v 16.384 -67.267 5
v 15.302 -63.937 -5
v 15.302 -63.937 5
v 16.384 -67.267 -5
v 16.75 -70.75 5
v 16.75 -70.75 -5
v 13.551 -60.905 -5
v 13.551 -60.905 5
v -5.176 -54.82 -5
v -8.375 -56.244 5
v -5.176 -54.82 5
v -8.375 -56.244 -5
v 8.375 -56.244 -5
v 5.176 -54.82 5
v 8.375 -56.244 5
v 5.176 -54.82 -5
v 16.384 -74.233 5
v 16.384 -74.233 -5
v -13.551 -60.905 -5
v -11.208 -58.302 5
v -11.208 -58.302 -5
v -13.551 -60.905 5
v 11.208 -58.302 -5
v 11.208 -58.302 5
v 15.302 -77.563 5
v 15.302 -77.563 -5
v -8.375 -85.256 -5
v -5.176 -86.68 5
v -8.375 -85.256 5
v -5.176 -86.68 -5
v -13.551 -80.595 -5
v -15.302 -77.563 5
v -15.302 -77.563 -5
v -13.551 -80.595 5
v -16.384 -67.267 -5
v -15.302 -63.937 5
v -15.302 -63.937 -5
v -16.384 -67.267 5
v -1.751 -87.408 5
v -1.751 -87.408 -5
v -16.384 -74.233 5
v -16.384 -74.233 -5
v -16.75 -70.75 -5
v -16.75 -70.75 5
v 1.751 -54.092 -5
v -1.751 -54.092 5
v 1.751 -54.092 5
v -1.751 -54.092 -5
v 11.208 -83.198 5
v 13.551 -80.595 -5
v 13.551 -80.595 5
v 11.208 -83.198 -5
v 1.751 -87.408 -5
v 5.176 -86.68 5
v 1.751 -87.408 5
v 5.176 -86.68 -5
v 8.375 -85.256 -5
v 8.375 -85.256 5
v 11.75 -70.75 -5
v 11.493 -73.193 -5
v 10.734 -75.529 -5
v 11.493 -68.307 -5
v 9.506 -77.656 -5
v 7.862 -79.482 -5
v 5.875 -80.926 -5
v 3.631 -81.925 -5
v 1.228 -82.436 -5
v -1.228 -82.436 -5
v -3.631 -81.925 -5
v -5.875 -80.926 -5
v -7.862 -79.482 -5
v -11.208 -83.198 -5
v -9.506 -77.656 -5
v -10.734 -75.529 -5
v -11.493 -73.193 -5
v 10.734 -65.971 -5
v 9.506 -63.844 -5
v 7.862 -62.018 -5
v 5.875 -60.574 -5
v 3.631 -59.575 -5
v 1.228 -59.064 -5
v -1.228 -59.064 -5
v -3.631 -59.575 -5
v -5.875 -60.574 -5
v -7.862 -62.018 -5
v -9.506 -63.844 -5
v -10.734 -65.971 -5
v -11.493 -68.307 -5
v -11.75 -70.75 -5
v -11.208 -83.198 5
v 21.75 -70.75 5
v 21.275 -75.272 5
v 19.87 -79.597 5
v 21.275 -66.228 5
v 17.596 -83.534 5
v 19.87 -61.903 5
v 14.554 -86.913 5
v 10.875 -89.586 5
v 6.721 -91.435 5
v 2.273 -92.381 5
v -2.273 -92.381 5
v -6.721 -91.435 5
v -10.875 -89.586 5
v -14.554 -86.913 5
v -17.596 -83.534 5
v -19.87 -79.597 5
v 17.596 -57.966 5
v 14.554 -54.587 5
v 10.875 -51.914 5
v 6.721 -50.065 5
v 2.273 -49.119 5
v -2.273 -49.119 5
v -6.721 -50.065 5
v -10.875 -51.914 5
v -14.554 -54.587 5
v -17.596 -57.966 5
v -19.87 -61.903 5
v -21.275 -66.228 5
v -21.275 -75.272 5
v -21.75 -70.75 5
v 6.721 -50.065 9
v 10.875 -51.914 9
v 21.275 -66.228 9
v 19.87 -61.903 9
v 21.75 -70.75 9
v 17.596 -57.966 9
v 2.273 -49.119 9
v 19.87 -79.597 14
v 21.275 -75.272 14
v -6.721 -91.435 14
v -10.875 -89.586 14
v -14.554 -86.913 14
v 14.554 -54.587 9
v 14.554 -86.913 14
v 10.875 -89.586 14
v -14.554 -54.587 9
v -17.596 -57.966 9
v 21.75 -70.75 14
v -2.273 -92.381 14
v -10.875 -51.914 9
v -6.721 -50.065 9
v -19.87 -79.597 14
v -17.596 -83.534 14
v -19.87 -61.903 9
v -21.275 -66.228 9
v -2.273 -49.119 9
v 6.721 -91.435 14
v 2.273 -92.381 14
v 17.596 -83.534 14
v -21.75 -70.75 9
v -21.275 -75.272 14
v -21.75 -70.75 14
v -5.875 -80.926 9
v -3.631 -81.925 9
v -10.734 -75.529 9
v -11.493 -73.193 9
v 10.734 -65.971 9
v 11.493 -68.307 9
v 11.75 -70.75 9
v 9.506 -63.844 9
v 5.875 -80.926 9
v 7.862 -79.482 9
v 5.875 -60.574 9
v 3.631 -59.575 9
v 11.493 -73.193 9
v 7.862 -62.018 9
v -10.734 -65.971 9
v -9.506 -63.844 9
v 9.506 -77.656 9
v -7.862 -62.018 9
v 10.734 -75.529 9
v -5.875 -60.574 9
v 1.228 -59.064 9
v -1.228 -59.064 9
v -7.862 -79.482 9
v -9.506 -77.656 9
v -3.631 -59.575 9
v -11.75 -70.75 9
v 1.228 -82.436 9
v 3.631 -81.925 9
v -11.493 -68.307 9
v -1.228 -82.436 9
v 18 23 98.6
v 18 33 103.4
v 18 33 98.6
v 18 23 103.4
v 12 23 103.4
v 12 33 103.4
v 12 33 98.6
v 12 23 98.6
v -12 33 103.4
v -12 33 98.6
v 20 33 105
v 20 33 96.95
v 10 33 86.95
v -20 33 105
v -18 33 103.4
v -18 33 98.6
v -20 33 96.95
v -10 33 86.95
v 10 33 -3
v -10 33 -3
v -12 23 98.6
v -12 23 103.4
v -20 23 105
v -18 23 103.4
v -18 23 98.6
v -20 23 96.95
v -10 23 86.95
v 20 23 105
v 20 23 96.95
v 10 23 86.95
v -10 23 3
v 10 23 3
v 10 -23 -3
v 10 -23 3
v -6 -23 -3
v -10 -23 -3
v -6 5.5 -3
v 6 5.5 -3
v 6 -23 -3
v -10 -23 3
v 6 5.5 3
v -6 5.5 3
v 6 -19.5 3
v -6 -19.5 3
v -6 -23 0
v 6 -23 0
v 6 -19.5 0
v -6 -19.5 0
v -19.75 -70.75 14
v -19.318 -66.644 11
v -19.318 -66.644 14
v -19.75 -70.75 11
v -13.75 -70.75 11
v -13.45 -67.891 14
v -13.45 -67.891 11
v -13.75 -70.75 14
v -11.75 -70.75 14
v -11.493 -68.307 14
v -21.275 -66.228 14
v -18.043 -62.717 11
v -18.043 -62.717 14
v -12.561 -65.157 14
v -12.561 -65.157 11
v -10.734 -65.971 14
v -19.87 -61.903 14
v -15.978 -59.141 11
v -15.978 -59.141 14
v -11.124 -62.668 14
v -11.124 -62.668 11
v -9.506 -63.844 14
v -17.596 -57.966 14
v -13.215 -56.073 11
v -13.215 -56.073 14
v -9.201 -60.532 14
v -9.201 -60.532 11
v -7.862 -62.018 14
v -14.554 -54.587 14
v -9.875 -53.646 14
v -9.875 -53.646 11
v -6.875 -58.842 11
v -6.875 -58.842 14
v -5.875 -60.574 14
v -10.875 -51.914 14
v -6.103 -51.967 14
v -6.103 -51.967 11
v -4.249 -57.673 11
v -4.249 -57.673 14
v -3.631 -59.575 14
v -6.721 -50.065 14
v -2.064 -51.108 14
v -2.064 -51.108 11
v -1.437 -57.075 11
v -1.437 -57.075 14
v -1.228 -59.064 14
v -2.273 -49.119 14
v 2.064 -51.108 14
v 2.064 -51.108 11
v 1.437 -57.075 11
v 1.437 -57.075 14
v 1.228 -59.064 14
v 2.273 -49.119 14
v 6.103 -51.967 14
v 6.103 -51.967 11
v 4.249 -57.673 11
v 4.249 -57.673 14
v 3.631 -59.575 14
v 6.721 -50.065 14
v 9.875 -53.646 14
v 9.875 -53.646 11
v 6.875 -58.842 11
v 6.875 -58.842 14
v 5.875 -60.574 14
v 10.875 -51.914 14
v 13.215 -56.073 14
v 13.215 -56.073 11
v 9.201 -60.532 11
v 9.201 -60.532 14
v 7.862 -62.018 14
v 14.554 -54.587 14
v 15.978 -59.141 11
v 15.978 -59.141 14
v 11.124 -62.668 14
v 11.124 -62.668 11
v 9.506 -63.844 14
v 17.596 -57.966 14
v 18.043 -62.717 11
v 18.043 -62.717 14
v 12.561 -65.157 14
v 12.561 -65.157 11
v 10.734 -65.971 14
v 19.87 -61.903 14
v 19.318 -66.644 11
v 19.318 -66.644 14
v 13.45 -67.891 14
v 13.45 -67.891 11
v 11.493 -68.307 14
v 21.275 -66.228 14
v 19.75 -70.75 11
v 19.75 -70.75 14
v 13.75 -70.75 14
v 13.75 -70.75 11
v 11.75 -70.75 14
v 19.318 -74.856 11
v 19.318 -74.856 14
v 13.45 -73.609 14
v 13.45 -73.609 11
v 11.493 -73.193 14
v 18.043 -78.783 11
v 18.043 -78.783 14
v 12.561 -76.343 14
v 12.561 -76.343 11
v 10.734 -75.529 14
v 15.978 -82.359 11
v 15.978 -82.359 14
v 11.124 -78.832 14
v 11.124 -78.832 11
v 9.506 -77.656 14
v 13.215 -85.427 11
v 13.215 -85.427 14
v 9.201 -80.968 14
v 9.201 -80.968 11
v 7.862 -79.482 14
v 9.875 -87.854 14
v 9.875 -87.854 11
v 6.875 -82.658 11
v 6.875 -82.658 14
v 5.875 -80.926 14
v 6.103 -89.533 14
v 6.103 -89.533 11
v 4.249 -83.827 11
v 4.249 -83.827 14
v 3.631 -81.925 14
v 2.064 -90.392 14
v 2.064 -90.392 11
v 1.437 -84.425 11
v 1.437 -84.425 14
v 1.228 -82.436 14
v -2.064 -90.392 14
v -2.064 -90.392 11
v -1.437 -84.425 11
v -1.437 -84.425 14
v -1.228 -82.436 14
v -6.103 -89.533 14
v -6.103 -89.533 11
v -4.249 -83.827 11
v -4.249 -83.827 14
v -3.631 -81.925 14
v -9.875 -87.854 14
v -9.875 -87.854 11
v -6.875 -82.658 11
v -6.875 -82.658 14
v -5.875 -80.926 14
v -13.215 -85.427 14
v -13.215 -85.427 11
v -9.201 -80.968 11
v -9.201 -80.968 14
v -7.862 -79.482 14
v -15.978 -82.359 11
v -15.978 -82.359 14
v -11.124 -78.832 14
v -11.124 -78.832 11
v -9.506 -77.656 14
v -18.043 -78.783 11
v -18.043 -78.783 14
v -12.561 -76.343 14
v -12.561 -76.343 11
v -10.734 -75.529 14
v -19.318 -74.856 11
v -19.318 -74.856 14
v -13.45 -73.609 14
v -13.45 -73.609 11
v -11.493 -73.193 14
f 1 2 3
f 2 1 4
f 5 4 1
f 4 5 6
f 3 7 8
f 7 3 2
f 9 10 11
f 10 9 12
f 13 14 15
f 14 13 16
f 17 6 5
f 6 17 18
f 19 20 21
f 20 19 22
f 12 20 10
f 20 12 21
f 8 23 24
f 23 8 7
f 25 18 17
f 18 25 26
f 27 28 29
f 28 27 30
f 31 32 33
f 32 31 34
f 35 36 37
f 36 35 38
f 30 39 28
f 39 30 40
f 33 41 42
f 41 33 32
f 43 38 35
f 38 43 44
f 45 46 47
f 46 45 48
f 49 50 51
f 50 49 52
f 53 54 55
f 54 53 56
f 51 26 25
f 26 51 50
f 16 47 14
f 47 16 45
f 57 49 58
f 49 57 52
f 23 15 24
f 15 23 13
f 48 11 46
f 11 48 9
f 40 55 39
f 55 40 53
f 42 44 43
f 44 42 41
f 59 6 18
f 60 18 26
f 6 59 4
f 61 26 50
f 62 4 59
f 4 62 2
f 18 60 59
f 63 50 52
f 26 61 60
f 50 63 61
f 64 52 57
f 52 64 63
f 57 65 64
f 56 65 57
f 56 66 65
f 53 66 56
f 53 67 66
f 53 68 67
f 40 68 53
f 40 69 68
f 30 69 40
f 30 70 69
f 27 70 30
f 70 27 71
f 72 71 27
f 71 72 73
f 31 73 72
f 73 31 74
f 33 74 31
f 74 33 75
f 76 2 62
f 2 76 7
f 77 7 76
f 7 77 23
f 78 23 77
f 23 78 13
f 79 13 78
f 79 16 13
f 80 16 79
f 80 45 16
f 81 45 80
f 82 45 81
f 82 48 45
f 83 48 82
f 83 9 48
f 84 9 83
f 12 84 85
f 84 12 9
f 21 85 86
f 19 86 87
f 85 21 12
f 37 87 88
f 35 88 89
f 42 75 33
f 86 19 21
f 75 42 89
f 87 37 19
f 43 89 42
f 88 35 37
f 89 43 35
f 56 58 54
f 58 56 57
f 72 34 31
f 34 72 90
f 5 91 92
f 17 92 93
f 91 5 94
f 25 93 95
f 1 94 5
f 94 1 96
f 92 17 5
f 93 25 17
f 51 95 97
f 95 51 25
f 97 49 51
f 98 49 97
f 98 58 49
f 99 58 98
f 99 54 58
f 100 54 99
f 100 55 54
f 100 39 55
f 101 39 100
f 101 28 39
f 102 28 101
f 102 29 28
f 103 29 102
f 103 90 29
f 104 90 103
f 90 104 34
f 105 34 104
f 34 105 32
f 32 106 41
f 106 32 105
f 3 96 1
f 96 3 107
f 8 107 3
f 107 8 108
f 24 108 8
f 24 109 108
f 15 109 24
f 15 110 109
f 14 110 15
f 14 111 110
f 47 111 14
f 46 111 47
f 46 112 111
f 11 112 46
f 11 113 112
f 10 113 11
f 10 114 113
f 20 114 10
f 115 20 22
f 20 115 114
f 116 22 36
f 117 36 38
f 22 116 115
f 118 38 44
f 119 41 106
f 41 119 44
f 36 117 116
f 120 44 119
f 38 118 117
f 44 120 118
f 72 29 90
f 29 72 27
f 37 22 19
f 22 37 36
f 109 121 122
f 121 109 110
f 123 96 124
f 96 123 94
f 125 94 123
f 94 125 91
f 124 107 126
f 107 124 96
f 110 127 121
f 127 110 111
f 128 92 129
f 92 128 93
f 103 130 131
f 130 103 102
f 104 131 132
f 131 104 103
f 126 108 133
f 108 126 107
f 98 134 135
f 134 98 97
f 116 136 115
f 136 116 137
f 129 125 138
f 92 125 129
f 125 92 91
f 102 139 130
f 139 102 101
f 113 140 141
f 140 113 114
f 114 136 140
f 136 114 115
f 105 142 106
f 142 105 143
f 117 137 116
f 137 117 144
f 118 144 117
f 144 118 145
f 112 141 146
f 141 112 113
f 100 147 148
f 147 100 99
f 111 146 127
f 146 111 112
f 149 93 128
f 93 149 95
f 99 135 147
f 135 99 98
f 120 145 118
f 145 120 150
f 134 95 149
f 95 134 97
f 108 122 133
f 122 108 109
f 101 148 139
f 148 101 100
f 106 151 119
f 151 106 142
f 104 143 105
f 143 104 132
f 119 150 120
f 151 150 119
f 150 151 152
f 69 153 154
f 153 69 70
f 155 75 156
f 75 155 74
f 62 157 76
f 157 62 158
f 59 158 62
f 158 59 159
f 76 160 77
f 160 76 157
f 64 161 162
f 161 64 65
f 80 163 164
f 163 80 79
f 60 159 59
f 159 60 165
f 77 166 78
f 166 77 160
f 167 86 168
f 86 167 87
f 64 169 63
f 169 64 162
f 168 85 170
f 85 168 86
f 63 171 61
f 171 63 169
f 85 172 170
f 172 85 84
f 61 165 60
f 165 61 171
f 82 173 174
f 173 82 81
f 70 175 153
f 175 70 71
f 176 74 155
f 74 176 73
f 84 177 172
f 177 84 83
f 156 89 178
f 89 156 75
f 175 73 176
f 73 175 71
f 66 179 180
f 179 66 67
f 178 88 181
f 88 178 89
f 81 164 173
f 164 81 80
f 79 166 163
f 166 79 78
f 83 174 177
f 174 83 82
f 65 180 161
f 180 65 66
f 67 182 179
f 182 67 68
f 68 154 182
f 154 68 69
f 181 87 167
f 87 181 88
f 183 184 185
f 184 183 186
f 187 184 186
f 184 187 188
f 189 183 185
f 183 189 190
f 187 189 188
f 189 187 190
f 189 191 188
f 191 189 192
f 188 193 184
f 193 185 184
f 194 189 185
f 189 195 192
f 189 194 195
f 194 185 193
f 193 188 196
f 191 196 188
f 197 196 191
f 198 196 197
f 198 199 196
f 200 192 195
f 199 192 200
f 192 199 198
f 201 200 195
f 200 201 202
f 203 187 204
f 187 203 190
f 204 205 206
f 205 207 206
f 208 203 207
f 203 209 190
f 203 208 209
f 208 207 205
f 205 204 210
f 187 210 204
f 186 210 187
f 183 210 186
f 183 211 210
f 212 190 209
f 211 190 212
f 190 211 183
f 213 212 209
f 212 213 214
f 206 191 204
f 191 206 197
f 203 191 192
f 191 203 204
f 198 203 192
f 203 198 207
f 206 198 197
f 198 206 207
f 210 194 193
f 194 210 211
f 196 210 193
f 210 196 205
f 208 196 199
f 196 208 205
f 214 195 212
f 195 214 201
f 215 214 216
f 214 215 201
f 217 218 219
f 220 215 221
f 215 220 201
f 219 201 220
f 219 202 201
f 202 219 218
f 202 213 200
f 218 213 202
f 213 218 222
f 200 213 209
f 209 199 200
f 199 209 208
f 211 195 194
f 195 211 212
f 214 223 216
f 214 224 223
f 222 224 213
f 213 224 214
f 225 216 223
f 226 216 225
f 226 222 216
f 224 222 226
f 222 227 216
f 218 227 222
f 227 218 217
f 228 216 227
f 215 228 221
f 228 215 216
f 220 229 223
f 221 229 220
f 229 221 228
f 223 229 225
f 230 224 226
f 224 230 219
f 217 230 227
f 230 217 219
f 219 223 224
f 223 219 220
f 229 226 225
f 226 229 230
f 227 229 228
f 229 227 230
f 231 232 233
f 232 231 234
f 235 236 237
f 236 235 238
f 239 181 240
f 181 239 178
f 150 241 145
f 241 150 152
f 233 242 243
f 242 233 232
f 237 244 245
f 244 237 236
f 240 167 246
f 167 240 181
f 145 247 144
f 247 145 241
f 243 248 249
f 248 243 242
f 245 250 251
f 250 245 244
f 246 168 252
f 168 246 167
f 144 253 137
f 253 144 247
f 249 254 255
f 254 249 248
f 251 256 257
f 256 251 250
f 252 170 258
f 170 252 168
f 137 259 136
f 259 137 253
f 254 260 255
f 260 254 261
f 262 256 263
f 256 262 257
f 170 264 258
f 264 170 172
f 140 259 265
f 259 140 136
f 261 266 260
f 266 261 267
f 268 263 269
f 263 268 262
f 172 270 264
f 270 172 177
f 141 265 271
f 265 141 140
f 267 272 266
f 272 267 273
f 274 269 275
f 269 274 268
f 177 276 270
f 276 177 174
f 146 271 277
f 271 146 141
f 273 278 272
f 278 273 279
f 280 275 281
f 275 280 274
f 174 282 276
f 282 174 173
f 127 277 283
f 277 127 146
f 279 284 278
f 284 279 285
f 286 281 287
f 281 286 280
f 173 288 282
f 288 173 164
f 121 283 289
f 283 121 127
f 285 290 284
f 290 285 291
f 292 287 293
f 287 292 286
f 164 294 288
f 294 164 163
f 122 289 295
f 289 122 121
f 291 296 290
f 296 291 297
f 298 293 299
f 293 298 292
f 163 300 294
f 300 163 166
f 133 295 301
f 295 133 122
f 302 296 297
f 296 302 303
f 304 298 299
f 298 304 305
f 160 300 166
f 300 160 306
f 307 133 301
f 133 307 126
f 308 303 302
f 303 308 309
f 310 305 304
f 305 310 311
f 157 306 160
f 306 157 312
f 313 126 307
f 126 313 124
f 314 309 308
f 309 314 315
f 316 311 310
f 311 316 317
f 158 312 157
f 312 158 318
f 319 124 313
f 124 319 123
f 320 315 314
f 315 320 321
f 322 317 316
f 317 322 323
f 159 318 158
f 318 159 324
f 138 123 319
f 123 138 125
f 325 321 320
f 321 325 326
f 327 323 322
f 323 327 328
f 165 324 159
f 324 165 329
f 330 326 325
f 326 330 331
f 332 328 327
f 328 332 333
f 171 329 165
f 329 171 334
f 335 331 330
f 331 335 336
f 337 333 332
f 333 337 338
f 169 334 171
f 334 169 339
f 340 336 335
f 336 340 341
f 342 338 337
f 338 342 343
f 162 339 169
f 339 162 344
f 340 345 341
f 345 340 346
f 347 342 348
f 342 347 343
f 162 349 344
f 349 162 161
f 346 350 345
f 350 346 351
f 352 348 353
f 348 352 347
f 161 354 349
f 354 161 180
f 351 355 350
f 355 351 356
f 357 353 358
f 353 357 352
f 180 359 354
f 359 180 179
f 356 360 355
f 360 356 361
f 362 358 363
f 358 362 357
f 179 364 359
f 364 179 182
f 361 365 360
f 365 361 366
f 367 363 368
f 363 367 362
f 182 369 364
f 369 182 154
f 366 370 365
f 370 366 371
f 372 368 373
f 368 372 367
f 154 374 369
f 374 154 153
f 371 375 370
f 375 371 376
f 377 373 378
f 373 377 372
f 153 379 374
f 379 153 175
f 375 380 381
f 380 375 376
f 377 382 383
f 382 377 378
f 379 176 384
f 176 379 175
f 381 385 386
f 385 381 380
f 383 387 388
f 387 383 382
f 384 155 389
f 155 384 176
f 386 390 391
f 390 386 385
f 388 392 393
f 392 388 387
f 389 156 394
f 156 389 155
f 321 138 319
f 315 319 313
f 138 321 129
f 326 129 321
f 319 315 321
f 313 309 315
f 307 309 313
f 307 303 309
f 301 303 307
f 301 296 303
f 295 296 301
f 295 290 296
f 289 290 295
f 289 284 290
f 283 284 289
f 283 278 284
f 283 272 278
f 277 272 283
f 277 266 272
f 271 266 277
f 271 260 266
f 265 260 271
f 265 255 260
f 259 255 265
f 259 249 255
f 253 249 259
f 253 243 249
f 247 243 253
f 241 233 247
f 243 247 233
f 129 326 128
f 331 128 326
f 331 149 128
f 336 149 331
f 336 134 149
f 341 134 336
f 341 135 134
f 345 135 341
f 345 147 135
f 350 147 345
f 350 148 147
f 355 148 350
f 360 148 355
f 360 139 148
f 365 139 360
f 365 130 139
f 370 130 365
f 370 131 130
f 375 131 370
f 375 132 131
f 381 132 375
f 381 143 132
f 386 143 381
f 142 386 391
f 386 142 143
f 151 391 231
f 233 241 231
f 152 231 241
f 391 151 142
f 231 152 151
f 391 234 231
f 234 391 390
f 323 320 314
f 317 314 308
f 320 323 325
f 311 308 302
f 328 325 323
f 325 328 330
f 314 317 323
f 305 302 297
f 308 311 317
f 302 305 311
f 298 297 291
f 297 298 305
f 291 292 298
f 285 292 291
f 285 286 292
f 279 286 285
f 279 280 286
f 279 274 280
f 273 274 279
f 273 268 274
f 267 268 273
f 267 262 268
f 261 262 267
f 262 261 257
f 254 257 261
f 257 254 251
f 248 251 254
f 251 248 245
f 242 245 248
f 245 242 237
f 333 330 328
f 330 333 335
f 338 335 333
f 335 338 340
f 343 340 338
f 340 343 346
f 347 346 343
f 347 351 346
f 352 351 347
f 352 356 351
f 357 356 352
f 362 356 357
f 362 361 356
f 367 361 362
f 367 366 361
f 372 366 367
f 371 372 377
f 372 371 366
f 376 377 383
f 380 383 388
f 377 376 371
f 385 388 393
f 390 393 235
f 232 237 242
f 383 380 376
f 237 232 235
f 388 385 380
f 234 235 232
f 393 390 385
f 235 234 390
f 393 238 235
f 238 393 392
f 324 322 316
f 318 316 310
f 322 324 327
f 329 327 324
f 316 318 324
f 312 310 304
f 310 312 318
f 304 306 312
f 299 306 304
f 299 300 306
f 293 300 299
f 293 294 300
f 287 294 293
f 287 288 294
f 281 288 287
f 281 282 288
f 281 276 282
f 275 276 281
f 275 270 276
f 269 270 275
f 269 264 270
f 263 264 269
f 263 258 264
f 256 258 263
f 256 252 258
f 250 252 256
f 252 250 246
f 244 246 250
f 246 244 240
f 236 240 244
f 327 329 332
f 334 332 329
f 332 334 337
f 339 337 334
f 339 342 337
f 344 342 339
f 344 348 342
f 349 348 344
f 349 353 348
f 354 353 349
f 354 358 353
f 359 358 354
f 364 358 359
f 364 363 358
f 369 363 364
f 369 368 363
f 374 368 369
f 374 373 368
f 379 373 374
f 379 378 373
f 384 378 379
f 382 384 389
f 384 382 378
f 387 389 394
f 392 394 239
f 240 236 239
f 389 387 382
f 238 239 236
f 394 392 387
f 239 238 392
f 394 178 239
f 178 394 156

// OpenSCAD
// file: hangon_clickin.scad
include <servo.scad>
include <parameters.scad>

//%back_holes();

module hangon(){
    //support
    mirror_copy([1,0,0])translate([hangon_support_distance,-hangon_support_length/2-(contact_delta/2)+5,-(5-(top_component_height*0.5))/2])
    cube([round(top_component_width*0.1),hangon_support_length+contact_delta,top_component_height*0.5], true);

    //base
    translate([0,shaft_center,0])
    difference(){
        cube([hangon_base_diameter,hangon_base_diameter,5], true);
        cylinder(10, hangon_base_diameter/2-5, hangon_base_diameter/2-5, true);
    }
}
// file: bearing_holder.scad
include <servo.scad>
include <parameters.scad>
include <hangon_clickin.scad>

%hangon();
shaft_hole_width = hangon_base_diameter/2-5;
holder_width = shaft_hole_width-1;
holder_height = 10;
bearing_pit_width = holder_width+5;
bearing_pit_height = 4;
shaft_hole_radius = holder_width-5;
wall_width = 2;
wall_height = 5;
pit_width = 10;

translate([0,shaft_center,0])
union(){
    difference(){
        //base
        union(){
            //holder
            cylinder(holder_height, holder_width, holder_width, true);
            //bearing pit base
            translate([0,0,holder_height/2+bearing_pit_height/2])
            cylinder(bearing_pit_height, bearing_pit_width, bearing_pit_width, true);
        }
        //shaft hole
        translate([0,0,bearing_pit_height/2])
        cylinder(holder_height+bearing_pit_height, shaft_hole_radius, shaft_hole_radius, true);
    }
}
//bearing pit
translate([0,shaft_center,-(shaft_hole_radius-(holder_height/2+bearing_pit_height))])
rotate_extrude(angle = 360, convexity = 10){
    polygon(points=[[shaft_hole_radius,shaft_hole_radius], [shaft_hole_radius+pit_width, shaft_hole_radius], [shaft_hole_radius+pit_width, shaft_hole_radius+wall_height], [shaft_hole_radius+pit_width-wall_width,shaft_hole_radius+wall_height], [shaft_hole_radius+pit_width-wall_width,shaft_hole_radius+wall_width], [shaft_hole_radius+wall_width,shaft_hole_radius+wall_width], [shaft_hole_radius+wall_width,shaft_hole_radius+wall_height], [shaft_hole_radius,shaft_hole_radius+wall_height]]);
};
// file: servo.scad
//parameters
servo_width = 12;
servo_length = 24;
servo_height = 24;
ex_length = 5;
ex_height = 4;
shaft_offset = 5;
shaft_radius = 5;
shaft_height = 5;

module mirror_copy(vec=[0,1,0]){
    children();
    mirror(vec)children();
}

module back_holes(){
    mirror_copy([1,0,0])translate([top_component_width/2-round((top_component_width*0.1)/2)-3,0,0])
    cube([round(top_component_width*0.15),back_component_length,top_component_height*0.6], true);    
}

module servo(){
    translate([0,0,servo_height/2])
    union(){
        //extrusion
        mirror_copy()
            translate([0,servo_length/2+ex_length/2,(servo_height/2)-ex_height/2])
                cube([servo_width, ex_length, ex_height], true);
        //shaft
        translate([0,-servo_length/2+shaft_radius,servo_height/2+shaft_height/2])
        cylinder(shaft_height, shaft_radius, shaft_radius, true);
        //base
        cube([servo_width, servo_length, servo_height], true);
    }
}
// file: base_clickin.scad
include <servo.scad>
include <parameters.scad>

module tower_base(){
    union(){
        //back tower
        union(){
            translate([0,back_offset,(back_component_height/2)-base_height/2])
            union(){
                //back holes
                translate([0,0,back_component_height/2+top_component_height/2])
                difference(){
                    cube([top_component_width,back_component_length,top_component_height], true);
                    back_holes();
                    
                }
                //back component
                cube([outer_width,back_component_length,back_component_height], true);
                //triangle supports
                hull(){
                    translate([0,0,back_component_height/2])
                    cube([top_component_width,back_component_length,0.1], true);
                    translate([0,0,back_component_height/2-10])
                    cube([outer_width,back_component_length,0.1], true);
                }
            }
        }
        //base
        difference(){
            difference(){
                cube([outer_width,outer_length,base_height], true);
                translate([0,-front_offset,0])
                cube([inner_width,inner_length,base_height], true);
            }
            translate([0,-outer_length/2+2,-2])
            cube([inner_width,4,4], true);
        }
    }
}

tower_base();
translate([0,-front_offset,0])
%servo();
// file: bearing_disc.scad
include <parameters.scad>
include <bearing_holder.scad>

/*
translate([0,-shaft_center,0])
bearing_holder();
*/

module bearing_disc(){
    translate([0, 0, 0])
    difference(){
    union(){
        difference(){
            union(){
                //lock high 1
                translate([0,hole_width/2+1,0])
                cube([disc_radius,4,disc_height+1]);
                //lock low 1
                translate([0,-1,0])
                hull(){
                    translate([0,-hole_width*1.5,0])
                    cube([disc_radius,0.1,disc_height-1]);
                    translate([0,-hole_width/2,0])
                    cube([disc_radius,0.1,disc_height]);
                }
                //lock high 2
                rotate([0,0,180])
                translate([0,hole_width/2+1,0])
                cube([disc_radius,4,disc_height+1]);
                //lock low 2
                rotate([0,0,180])
                translate([0,-1,0])
                hull(){
                    translate([0,-hole_width*1.5,0])
                    cube([disc_radius,0.1,disc_height-1]);
                    translate([0,-hole_width/2,0])
                    cube([disc_radius,0.1,disc_height]);
                }
                //disc
                cylinder(disc_height,disc_radius,disc_radius, true);
            }
            //shaft hole
            cylinder(disc_height+10, shaft_raidus, shaft_raidus, true);
        }
    }
    difference(){
        cylinder(10,disc_radius+10,disc_radius+10, true);
        cylinder(10,disc_radius, disc_radius, true);
    }
}
}
// file: shaft.scad
include <parameters.scad>
include <bearing_disc.scad>
include <base_clickin.scad>
include <servo.scad>

/*
translate([0,0,bearing_delta])
%bearing_disc();


//tower base and servo
rotate([0,180,0])   
translate([0,center_on_shaft,-back_component_height])
union(){
    tower_base();
    translate([0,-front_offset,0])
    %servo();
}

*/
module shaft(){
    union(){
        translate([0,0,shaft_pole_height/2+shaft_grip_height/2])
        cylinder(shaft_grip_height, shaft_girth, shaft_girth, true);
        //shaft
        cylinder(shaft_pole_height, shaft_girth, shaft_girth, true);
        //lock ex
        translate([0,0,lock_ex_displacement])
        cube([lock_ex_length, lock_ex_width, disc_height], true);
    }
}

/*
translate([0,0,pole_up_trans])
shaft();
*/

//shaft();
// file: parameters.scad
//parameters

//base
back_length = 10;
outer_width = 20;
outer_length = 36+back_length;
inner_width = 12;
inner_length = 25;
base_height = 6;
front_offset = round((outer_length-inner_length)/2)-4;
back_component_length = 10;
back_component_height = 100;
back_offset = outer_length/2+back_component_length/2;
top_component_height = 8;
top_component_width = 40;

//hangon
contact_delta = 50;
hangon_support_length = 8;
hangon_support_delta = 2.5;
hangon_support_distance = (top_component_width/2-round((top_component_width*0.1)/2)-hangon_support_delta);
shaft_center = (-hangon_support_length-((hangon_support_distance+10)/2))-contact_delta;
hangon_base_diameter = hangon_support_distance+30;

//fixture
top_part_diplacement = 8;
leg_width = 2;
clickon_height = 2;

//bearing_pit
shaft_hole_width = hangon_base_diameter/2-5;
holder_width = shaft_hole_width-1;
holder_height = 10;
bearing_pit_width = holder_width+5;
bearing_pit_height = 4;
shaft_hole_radius = holder_width-5;
wall_width = 2;
wall_height = 5;
pit_width = 10;

//bearing_disc
//disc_radius = shaft_hole_radius+pit_width;
disc_radius = 10;
disc_height = 4;
hole_length = (shaft_hole_radius*2)-2;
hole_width = 2;
shaft_raidus = (hole_length/2)*0.6;

//servo
servo_width = 12;
servo_length = 24;
servo_height = 24;
ex_length = 5;
ex_height = 4;
shaft_radius = 5;
shaft_height = 5;
shaft_offset = -servo_length/2+shaft_radius+3;

//ball bearings
ball_bearing_length = 8;
ball_bearing_height = 3;

//shaft
shaft_girth = shaft_raidus-(0.5/2);
shaft_pole_height = 60;
shaft_grip_height = 5;
shaft_fitting = 4;
pole_up_trans = back_component_height/2-(servo_height/2+shaft_height/2)+((servo_height+shaft_height)-shaft_pole_height/2)+shaft_fitting;
//lock_ex_width = hole_width*0.8;
lock_ex_width = 2;
//lock_ex_length = hole_length-0.5;
lock_ex_length = 2;
lock_ex_displacement = -17.6;

//shaft_grip
shaft_grip_radius = 12;



//complete 
bearing_delta = 4;
center_on_shaft = front_offset-shaft_offset;
// main file
include <parameters.scad>
include <shaft.scad>

//cylinder(shaft_grip_height, shaft_girth, shaft_girth, true);

module star_shape(factor = 1.8){
    a = 6.5;
    p1x = cos(90)*10;
    p1y = sin(90)*10;
    p2x = cos(45)*10;
    p2y = sin(45)*10;
    p3x = cos(0)*10;
    p3y = sin(0)*10;
    points=[//inside points
            [p1x/factor,p1y/factor],//0
            [p2x/factor,p2y/factor],
            [p3x/factor,p3y/factor],
            [p3x/factor,-p3y/factor],//3
            [p2x/factor,-p2y/factor],
            [p1x/factor,-p1y/factor],//5w
            [-p1x/factor,-p1y/factor],
            [-p2x/factor,-p2y/factor],
            [-p3x/factor,-p3y/factor],
            [-p3x/factor,p3y/factor],
            [-p2x/factor,p2y/factor],
           [-p1x/factor,p1y/factor], //11
            //inside walls
            [5,15],//12
            [15,5],
            [15,-5],
            [5,-15],
            [-5,-15],
            [-15,-5],
            [-15,5],
            [-5,15]//19
            ];
    paths=[[0, 12, 1, 13, 2, 3, 14, 4, 15, 5, 6, 16, 7, 17, 8, 9, 18, 10, 19, 11]];
    polygon(points, paths);
}


module shaft_grip(){
    union(){
        difference(){
        cylinder(shaft_grip_height, 12, 12, true);
            //hole
        cylinder(shaft_grip_height, 8, 8, true);
            //hole
        }
        difference(){
            cylinder(shaft_grip_height, 12, 12, true);
            //hole
            linear_extrude(height=shaft_grip_height, center=true){
                star_shape(5);
            }
        }
    }
}
